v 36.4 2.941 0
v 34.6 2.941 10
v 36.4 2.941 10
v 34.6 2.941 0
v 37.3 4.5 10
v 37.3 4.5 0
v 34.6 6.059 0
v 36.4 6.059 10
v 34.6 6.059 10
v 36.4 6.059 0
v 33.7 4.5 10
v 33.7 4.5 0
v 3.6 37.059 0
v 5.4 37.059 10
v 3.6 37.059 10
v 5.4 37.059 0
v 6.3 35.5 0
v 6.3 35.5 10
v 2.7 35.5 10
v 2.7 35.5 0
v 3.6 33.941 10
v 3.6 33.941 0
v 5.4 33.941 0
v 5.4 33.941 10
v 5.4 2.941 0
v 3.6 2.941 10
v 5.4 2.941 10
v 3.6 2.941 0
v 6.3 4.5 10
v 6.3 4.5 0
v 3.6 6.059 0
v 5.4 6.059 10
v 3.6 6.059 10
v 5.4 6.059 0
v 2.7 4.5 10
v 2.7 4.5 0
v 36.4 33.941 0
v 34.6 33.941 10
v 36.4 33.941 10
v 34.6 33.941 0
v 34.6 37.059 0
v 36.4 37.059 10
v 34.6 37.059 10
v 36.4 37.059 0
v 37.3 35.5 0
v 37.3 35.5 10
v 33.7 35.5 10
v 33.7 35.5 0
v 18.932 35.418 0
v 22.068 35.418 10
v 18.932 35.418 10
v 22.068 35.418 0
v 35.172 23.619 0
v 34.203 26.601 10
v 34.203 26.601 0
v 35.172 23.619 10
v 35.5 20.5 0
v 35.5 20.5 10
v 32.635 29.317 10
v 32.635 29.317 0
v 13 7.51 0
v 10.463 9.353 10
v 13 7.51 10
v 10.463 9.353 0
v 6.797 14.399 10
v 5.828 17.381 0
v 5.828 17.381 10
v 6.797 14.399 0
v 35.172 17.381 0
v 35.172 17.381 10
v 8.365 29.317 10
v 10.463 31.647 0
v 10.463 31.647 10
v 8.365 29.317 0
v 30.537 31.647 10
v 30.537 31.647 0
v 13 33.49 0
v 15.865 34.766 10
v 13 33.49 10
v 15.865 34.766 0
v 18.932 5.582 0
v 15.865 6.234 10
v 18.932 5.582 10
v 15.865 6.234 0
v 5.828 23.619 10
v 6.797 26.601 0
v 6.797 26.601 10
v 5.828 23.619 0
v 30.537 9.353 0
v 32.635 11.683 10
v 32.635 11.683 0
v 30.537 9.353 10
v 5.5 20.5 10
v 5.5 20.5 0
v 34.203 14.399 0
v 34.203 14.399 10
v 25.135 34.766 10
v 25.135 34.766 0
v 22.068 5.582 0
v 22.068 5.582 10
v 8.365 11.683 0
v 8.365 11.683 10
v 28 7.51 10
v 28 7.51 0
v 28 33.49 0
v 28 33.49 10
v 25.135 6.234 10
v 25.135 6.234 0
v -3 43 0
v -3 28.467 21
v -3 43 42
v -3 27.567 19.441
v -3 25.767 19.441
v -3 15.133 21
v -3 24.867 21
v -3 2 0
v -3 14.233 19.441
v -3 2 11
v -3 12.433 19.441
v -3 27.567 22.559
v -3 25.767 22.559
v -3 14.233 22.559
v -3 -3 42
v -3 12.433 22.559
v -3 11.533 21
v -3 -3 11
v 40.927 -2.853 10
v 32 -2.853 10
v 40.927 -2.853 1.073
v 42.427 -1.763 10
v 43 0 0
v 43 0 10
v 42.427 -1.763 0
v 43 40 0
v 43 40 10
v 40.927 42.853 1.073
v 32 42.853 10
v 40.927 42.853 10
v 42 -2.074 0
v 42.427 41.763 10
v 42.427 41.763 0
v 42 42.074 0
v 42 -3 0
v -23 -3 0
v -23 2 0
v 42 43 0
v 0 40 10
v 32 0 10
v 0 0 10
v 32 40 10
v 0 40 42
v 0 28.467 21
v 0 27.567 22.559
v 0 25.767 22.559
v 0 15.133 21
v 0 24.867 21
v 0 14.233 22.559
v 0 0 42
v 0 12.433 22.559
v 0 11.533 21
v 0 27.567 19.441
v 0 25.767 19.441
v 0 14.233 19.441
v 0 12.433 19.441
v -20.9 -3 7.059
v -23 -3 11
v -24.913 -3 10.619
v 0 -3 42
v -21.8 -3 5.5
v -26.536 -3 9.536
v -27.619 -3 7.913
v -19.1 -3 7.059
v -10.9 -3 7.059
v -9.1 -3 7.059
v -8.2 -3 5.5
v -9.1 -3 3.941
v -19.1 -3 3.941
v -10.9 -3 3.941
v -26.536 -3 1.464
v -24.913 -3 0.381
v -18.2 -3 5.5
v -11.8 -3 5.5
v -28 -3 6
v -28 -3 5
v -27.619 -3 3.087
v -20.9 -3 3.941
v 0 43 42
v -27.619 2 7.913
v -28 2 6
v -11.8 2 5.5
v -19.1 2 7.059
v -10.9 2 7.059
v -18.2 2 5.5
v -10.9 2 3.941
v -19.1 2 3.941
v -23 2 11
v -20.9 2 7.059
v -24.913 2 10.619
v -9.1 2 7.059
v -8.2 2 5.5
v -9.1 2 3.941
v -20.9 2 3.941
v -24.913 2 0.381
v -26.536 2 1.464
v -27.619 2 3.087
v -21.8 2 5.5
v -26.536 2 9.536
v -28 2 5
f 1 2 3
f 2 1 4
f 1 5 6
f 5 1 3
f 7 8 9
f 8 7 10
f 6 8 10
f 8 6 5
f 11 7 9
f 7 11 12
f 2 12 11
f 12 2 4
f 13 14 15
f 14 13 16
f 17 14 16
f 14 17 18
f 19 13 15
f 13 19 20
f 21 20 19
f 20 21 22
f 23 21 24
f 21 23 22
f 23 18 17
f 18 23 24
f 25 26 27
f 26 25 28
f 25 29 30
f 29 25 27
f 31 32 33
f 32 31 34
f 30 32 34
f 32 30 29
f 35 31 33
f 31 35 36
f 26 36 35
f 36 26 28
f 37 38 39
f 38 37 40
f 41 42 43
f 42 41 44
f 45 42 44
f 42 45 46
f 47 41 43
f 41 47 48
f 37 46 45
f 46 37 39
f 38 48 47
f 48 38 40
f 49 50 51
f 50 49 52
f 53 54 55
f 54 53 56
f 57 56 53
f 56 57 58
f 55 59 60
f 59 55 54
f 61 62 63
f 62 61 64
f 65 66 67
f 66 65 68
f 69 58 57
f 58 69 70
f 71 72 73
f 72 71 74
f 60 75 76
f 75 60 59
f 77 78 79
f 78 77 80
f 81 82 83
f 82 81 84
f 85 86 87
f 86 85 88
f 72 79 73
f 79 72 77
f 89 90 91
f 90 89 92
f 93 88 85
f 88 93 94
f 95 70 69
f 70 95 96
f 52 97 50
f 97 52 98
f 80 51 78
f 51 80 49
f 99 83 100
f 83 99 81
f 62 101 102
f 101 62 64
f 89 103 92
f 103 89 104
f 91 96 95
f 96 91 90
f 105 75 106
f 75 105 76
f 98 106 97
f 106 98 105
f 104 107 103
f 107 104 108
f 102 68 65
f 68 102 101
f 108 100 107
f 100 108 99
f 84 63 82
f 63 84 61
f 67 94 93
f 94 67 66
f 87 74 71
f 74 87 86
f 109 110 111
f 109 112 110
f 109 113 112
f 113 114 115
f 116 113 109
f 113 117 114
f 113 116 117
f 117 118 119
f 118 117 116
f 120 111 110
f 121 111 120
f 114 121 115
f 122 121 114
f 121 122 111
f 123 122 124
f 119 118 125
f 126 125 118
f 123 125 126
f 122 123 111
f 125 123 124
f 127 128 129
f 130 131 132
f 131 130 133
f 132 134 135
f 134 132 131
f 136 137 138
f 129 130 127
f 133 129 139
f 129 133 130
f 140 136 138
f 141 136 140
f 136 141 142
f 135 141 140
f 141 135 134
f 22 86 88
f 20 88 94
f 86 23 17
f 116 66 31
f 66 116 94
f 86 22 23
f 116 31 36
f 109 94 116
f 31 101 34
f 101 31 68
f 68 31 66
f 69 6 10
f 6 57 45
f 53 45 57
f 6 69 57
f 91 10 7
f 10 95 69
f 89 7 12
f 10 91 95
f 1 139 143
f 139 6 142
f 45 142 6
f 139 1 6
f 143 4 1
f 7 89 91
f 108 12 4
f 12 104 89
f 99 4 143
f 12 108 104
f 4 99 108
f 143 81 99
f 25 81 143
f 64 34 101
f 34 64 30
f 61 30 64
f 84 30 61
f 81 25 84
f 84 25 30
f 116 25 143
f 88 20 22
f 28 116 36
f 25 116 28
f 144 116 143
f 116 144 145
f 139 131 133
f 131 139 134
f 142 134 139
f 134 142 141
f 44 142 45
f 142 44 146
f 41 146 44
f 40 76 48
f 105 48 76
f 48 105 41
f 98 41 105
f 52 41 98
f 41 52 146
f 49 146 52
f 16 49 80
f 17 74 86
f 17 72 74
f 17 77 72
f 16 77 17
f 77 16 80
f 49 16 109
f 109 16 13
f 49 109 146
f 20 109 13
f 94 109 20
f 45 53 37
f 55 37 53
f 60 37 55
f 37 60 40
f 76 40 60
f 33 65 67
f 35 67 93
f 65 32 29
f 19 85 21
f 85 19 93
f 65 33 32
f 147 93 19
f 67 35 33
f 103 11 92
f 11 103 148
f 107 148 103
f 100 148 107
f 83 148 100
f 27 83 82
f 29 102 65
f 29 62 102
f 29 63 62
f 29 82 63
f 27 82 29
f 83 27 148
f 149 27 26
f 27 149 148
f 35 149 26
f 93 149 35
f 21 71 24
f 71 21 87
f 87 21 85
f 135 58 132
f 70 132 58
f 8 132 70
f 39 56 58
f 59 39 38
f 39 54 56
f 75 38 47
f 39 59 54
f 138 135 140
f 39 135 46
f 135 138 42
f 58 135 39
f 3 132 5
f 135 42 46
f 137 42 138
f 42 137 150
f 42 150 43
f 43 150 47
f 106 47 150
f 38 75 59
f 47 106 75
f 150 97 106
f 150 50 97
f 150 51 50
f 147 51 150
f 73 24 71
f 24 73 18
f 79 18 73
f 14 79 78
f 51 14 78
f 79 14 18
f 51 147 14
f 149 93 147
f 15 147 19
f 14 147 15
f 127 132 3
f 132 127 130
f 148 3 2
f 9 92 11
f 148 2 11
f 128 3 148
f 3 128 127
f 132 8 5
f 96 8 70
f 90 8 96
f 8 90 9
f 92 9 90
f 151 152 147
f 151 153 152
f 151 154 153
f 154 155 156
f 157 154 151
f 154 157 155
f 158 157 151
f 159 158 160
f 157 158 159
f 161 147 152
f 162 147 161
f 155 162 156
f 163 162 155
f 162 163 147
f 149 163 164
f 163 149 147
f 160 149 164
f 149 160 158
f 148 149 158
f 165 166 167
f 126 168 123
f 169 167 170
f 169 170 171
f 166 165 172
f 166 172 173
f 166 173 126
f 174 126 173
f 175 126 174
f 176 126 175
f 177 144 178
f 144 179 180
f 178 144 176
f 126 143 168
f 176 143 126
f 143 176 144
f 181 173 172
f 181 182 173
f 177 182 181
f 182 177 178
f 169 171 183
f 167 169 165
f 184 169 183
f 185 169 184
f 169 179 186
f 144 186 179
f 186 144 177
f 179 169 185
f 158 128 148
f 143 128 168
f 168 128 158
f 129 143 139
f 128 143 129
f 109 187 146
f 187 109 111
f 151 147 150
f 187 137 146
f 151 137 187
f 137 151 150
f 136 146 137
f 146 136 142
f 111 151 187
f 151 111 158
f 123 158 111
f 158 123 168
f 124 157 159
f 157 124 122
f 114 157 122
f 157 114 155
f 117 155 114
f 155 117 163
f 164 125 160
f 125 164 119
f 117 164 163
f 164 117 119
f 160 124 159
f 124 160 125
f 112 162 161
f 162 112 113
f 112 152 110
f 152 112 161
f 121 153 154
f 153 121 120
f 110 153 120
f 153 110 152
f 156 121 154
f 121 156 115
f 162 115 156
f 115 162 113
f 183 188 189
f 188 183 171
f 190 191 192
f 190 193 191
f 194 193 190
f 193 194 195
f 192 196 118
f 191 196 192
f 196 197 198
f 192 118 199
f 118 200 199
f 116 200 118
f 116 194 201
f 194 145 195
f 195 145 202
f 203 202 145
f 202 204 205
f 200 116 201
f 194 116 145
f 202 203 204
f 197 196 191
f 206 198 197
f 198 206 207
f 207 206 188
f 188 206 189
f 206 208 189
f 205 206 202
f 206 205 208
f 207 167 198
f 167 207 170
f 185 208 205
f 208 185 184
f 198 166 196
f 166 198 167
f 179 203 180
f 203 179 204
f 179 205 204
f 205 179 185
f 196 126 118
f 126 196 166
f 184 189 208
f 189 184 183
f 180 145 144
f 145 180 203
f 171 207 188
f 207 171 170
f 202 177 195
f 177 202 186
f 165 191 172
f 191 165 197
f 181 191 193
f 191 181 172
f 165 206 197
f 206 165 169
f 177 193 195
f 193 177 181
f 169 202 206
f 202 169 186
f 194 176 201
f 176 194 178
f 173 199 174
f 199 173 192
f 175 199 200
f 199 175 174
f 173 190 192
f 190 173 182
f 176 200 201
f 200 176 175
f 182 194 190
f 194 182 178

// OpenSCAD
screwdistnema17=31;
xymot=40;
M3=1.8;
module topplate() {minkowski()
{
 cube([xymot,xymot,5]);
 cylinder(r=3,h=5);
}
}
//the holeplate module defines the motor bracket 
module holeplate(){
difference(){
	topplate();
	translate([(xymot-screwdistnema17)/2,(xymot-screwdistnema17)/2,-10]){
		translate([screwdistnema17,0,0])cylinder(r=M3,h=150);
		translate([0,screwdistnema17,0])cylinder(r=M3,h=150);
		cylinder(r=M3,h=150);
		translate([screwdistnema17,screwdistnema17,0])cylinder(r=M3, h=150);
		translate([xymot/2.5, xymot/2.5, 0])cylinder(r=15, h=150);
	}
}
}
//this function joins the four elements of the motormount
module braceplate(){
difference(){
	union() {
		holeplate();
		translate([0,-3,0])rotate([0,0,0])triangle(3,42);
		translate([0,xymot,0])triangle(3,42);
		translate([-3,-3,0])rotate([90,0,90])cube([46,42,3]);
}
	translate([-10,xymot/3,21])rotate([90,0,90])cylinder(r=M3, h=150);
	translate([-10,xymot/1.5,21])rotate([90,0,90])cylinder(r=M3, h=150);
}
}
//this module generates the triangular side brace
module triangle(thickness,h){
	difference(){
		cube([h, thickness, h]);
		translate([0,-5,h])rotate([0,45,0])cube([h*2,thickness+10,h]);
	}
}
module braceplatearm(){
union(){
	braceplate();
	translate([-23,2,5])rotate([90,0,0])minkowski()
{
	cube([20,1,2]);
	cylinder(r=5,h=3);
}
}
}
difference(){
	braceplatearm();
	rotate([90,0,0])translate([-xymot/2,5.5,-10])cylinder(r=M3,h=100);
	rotate([90,0,0])translate([-xymot/4,5.5,-10])cylinder(r=M3,h=100);
}




	
